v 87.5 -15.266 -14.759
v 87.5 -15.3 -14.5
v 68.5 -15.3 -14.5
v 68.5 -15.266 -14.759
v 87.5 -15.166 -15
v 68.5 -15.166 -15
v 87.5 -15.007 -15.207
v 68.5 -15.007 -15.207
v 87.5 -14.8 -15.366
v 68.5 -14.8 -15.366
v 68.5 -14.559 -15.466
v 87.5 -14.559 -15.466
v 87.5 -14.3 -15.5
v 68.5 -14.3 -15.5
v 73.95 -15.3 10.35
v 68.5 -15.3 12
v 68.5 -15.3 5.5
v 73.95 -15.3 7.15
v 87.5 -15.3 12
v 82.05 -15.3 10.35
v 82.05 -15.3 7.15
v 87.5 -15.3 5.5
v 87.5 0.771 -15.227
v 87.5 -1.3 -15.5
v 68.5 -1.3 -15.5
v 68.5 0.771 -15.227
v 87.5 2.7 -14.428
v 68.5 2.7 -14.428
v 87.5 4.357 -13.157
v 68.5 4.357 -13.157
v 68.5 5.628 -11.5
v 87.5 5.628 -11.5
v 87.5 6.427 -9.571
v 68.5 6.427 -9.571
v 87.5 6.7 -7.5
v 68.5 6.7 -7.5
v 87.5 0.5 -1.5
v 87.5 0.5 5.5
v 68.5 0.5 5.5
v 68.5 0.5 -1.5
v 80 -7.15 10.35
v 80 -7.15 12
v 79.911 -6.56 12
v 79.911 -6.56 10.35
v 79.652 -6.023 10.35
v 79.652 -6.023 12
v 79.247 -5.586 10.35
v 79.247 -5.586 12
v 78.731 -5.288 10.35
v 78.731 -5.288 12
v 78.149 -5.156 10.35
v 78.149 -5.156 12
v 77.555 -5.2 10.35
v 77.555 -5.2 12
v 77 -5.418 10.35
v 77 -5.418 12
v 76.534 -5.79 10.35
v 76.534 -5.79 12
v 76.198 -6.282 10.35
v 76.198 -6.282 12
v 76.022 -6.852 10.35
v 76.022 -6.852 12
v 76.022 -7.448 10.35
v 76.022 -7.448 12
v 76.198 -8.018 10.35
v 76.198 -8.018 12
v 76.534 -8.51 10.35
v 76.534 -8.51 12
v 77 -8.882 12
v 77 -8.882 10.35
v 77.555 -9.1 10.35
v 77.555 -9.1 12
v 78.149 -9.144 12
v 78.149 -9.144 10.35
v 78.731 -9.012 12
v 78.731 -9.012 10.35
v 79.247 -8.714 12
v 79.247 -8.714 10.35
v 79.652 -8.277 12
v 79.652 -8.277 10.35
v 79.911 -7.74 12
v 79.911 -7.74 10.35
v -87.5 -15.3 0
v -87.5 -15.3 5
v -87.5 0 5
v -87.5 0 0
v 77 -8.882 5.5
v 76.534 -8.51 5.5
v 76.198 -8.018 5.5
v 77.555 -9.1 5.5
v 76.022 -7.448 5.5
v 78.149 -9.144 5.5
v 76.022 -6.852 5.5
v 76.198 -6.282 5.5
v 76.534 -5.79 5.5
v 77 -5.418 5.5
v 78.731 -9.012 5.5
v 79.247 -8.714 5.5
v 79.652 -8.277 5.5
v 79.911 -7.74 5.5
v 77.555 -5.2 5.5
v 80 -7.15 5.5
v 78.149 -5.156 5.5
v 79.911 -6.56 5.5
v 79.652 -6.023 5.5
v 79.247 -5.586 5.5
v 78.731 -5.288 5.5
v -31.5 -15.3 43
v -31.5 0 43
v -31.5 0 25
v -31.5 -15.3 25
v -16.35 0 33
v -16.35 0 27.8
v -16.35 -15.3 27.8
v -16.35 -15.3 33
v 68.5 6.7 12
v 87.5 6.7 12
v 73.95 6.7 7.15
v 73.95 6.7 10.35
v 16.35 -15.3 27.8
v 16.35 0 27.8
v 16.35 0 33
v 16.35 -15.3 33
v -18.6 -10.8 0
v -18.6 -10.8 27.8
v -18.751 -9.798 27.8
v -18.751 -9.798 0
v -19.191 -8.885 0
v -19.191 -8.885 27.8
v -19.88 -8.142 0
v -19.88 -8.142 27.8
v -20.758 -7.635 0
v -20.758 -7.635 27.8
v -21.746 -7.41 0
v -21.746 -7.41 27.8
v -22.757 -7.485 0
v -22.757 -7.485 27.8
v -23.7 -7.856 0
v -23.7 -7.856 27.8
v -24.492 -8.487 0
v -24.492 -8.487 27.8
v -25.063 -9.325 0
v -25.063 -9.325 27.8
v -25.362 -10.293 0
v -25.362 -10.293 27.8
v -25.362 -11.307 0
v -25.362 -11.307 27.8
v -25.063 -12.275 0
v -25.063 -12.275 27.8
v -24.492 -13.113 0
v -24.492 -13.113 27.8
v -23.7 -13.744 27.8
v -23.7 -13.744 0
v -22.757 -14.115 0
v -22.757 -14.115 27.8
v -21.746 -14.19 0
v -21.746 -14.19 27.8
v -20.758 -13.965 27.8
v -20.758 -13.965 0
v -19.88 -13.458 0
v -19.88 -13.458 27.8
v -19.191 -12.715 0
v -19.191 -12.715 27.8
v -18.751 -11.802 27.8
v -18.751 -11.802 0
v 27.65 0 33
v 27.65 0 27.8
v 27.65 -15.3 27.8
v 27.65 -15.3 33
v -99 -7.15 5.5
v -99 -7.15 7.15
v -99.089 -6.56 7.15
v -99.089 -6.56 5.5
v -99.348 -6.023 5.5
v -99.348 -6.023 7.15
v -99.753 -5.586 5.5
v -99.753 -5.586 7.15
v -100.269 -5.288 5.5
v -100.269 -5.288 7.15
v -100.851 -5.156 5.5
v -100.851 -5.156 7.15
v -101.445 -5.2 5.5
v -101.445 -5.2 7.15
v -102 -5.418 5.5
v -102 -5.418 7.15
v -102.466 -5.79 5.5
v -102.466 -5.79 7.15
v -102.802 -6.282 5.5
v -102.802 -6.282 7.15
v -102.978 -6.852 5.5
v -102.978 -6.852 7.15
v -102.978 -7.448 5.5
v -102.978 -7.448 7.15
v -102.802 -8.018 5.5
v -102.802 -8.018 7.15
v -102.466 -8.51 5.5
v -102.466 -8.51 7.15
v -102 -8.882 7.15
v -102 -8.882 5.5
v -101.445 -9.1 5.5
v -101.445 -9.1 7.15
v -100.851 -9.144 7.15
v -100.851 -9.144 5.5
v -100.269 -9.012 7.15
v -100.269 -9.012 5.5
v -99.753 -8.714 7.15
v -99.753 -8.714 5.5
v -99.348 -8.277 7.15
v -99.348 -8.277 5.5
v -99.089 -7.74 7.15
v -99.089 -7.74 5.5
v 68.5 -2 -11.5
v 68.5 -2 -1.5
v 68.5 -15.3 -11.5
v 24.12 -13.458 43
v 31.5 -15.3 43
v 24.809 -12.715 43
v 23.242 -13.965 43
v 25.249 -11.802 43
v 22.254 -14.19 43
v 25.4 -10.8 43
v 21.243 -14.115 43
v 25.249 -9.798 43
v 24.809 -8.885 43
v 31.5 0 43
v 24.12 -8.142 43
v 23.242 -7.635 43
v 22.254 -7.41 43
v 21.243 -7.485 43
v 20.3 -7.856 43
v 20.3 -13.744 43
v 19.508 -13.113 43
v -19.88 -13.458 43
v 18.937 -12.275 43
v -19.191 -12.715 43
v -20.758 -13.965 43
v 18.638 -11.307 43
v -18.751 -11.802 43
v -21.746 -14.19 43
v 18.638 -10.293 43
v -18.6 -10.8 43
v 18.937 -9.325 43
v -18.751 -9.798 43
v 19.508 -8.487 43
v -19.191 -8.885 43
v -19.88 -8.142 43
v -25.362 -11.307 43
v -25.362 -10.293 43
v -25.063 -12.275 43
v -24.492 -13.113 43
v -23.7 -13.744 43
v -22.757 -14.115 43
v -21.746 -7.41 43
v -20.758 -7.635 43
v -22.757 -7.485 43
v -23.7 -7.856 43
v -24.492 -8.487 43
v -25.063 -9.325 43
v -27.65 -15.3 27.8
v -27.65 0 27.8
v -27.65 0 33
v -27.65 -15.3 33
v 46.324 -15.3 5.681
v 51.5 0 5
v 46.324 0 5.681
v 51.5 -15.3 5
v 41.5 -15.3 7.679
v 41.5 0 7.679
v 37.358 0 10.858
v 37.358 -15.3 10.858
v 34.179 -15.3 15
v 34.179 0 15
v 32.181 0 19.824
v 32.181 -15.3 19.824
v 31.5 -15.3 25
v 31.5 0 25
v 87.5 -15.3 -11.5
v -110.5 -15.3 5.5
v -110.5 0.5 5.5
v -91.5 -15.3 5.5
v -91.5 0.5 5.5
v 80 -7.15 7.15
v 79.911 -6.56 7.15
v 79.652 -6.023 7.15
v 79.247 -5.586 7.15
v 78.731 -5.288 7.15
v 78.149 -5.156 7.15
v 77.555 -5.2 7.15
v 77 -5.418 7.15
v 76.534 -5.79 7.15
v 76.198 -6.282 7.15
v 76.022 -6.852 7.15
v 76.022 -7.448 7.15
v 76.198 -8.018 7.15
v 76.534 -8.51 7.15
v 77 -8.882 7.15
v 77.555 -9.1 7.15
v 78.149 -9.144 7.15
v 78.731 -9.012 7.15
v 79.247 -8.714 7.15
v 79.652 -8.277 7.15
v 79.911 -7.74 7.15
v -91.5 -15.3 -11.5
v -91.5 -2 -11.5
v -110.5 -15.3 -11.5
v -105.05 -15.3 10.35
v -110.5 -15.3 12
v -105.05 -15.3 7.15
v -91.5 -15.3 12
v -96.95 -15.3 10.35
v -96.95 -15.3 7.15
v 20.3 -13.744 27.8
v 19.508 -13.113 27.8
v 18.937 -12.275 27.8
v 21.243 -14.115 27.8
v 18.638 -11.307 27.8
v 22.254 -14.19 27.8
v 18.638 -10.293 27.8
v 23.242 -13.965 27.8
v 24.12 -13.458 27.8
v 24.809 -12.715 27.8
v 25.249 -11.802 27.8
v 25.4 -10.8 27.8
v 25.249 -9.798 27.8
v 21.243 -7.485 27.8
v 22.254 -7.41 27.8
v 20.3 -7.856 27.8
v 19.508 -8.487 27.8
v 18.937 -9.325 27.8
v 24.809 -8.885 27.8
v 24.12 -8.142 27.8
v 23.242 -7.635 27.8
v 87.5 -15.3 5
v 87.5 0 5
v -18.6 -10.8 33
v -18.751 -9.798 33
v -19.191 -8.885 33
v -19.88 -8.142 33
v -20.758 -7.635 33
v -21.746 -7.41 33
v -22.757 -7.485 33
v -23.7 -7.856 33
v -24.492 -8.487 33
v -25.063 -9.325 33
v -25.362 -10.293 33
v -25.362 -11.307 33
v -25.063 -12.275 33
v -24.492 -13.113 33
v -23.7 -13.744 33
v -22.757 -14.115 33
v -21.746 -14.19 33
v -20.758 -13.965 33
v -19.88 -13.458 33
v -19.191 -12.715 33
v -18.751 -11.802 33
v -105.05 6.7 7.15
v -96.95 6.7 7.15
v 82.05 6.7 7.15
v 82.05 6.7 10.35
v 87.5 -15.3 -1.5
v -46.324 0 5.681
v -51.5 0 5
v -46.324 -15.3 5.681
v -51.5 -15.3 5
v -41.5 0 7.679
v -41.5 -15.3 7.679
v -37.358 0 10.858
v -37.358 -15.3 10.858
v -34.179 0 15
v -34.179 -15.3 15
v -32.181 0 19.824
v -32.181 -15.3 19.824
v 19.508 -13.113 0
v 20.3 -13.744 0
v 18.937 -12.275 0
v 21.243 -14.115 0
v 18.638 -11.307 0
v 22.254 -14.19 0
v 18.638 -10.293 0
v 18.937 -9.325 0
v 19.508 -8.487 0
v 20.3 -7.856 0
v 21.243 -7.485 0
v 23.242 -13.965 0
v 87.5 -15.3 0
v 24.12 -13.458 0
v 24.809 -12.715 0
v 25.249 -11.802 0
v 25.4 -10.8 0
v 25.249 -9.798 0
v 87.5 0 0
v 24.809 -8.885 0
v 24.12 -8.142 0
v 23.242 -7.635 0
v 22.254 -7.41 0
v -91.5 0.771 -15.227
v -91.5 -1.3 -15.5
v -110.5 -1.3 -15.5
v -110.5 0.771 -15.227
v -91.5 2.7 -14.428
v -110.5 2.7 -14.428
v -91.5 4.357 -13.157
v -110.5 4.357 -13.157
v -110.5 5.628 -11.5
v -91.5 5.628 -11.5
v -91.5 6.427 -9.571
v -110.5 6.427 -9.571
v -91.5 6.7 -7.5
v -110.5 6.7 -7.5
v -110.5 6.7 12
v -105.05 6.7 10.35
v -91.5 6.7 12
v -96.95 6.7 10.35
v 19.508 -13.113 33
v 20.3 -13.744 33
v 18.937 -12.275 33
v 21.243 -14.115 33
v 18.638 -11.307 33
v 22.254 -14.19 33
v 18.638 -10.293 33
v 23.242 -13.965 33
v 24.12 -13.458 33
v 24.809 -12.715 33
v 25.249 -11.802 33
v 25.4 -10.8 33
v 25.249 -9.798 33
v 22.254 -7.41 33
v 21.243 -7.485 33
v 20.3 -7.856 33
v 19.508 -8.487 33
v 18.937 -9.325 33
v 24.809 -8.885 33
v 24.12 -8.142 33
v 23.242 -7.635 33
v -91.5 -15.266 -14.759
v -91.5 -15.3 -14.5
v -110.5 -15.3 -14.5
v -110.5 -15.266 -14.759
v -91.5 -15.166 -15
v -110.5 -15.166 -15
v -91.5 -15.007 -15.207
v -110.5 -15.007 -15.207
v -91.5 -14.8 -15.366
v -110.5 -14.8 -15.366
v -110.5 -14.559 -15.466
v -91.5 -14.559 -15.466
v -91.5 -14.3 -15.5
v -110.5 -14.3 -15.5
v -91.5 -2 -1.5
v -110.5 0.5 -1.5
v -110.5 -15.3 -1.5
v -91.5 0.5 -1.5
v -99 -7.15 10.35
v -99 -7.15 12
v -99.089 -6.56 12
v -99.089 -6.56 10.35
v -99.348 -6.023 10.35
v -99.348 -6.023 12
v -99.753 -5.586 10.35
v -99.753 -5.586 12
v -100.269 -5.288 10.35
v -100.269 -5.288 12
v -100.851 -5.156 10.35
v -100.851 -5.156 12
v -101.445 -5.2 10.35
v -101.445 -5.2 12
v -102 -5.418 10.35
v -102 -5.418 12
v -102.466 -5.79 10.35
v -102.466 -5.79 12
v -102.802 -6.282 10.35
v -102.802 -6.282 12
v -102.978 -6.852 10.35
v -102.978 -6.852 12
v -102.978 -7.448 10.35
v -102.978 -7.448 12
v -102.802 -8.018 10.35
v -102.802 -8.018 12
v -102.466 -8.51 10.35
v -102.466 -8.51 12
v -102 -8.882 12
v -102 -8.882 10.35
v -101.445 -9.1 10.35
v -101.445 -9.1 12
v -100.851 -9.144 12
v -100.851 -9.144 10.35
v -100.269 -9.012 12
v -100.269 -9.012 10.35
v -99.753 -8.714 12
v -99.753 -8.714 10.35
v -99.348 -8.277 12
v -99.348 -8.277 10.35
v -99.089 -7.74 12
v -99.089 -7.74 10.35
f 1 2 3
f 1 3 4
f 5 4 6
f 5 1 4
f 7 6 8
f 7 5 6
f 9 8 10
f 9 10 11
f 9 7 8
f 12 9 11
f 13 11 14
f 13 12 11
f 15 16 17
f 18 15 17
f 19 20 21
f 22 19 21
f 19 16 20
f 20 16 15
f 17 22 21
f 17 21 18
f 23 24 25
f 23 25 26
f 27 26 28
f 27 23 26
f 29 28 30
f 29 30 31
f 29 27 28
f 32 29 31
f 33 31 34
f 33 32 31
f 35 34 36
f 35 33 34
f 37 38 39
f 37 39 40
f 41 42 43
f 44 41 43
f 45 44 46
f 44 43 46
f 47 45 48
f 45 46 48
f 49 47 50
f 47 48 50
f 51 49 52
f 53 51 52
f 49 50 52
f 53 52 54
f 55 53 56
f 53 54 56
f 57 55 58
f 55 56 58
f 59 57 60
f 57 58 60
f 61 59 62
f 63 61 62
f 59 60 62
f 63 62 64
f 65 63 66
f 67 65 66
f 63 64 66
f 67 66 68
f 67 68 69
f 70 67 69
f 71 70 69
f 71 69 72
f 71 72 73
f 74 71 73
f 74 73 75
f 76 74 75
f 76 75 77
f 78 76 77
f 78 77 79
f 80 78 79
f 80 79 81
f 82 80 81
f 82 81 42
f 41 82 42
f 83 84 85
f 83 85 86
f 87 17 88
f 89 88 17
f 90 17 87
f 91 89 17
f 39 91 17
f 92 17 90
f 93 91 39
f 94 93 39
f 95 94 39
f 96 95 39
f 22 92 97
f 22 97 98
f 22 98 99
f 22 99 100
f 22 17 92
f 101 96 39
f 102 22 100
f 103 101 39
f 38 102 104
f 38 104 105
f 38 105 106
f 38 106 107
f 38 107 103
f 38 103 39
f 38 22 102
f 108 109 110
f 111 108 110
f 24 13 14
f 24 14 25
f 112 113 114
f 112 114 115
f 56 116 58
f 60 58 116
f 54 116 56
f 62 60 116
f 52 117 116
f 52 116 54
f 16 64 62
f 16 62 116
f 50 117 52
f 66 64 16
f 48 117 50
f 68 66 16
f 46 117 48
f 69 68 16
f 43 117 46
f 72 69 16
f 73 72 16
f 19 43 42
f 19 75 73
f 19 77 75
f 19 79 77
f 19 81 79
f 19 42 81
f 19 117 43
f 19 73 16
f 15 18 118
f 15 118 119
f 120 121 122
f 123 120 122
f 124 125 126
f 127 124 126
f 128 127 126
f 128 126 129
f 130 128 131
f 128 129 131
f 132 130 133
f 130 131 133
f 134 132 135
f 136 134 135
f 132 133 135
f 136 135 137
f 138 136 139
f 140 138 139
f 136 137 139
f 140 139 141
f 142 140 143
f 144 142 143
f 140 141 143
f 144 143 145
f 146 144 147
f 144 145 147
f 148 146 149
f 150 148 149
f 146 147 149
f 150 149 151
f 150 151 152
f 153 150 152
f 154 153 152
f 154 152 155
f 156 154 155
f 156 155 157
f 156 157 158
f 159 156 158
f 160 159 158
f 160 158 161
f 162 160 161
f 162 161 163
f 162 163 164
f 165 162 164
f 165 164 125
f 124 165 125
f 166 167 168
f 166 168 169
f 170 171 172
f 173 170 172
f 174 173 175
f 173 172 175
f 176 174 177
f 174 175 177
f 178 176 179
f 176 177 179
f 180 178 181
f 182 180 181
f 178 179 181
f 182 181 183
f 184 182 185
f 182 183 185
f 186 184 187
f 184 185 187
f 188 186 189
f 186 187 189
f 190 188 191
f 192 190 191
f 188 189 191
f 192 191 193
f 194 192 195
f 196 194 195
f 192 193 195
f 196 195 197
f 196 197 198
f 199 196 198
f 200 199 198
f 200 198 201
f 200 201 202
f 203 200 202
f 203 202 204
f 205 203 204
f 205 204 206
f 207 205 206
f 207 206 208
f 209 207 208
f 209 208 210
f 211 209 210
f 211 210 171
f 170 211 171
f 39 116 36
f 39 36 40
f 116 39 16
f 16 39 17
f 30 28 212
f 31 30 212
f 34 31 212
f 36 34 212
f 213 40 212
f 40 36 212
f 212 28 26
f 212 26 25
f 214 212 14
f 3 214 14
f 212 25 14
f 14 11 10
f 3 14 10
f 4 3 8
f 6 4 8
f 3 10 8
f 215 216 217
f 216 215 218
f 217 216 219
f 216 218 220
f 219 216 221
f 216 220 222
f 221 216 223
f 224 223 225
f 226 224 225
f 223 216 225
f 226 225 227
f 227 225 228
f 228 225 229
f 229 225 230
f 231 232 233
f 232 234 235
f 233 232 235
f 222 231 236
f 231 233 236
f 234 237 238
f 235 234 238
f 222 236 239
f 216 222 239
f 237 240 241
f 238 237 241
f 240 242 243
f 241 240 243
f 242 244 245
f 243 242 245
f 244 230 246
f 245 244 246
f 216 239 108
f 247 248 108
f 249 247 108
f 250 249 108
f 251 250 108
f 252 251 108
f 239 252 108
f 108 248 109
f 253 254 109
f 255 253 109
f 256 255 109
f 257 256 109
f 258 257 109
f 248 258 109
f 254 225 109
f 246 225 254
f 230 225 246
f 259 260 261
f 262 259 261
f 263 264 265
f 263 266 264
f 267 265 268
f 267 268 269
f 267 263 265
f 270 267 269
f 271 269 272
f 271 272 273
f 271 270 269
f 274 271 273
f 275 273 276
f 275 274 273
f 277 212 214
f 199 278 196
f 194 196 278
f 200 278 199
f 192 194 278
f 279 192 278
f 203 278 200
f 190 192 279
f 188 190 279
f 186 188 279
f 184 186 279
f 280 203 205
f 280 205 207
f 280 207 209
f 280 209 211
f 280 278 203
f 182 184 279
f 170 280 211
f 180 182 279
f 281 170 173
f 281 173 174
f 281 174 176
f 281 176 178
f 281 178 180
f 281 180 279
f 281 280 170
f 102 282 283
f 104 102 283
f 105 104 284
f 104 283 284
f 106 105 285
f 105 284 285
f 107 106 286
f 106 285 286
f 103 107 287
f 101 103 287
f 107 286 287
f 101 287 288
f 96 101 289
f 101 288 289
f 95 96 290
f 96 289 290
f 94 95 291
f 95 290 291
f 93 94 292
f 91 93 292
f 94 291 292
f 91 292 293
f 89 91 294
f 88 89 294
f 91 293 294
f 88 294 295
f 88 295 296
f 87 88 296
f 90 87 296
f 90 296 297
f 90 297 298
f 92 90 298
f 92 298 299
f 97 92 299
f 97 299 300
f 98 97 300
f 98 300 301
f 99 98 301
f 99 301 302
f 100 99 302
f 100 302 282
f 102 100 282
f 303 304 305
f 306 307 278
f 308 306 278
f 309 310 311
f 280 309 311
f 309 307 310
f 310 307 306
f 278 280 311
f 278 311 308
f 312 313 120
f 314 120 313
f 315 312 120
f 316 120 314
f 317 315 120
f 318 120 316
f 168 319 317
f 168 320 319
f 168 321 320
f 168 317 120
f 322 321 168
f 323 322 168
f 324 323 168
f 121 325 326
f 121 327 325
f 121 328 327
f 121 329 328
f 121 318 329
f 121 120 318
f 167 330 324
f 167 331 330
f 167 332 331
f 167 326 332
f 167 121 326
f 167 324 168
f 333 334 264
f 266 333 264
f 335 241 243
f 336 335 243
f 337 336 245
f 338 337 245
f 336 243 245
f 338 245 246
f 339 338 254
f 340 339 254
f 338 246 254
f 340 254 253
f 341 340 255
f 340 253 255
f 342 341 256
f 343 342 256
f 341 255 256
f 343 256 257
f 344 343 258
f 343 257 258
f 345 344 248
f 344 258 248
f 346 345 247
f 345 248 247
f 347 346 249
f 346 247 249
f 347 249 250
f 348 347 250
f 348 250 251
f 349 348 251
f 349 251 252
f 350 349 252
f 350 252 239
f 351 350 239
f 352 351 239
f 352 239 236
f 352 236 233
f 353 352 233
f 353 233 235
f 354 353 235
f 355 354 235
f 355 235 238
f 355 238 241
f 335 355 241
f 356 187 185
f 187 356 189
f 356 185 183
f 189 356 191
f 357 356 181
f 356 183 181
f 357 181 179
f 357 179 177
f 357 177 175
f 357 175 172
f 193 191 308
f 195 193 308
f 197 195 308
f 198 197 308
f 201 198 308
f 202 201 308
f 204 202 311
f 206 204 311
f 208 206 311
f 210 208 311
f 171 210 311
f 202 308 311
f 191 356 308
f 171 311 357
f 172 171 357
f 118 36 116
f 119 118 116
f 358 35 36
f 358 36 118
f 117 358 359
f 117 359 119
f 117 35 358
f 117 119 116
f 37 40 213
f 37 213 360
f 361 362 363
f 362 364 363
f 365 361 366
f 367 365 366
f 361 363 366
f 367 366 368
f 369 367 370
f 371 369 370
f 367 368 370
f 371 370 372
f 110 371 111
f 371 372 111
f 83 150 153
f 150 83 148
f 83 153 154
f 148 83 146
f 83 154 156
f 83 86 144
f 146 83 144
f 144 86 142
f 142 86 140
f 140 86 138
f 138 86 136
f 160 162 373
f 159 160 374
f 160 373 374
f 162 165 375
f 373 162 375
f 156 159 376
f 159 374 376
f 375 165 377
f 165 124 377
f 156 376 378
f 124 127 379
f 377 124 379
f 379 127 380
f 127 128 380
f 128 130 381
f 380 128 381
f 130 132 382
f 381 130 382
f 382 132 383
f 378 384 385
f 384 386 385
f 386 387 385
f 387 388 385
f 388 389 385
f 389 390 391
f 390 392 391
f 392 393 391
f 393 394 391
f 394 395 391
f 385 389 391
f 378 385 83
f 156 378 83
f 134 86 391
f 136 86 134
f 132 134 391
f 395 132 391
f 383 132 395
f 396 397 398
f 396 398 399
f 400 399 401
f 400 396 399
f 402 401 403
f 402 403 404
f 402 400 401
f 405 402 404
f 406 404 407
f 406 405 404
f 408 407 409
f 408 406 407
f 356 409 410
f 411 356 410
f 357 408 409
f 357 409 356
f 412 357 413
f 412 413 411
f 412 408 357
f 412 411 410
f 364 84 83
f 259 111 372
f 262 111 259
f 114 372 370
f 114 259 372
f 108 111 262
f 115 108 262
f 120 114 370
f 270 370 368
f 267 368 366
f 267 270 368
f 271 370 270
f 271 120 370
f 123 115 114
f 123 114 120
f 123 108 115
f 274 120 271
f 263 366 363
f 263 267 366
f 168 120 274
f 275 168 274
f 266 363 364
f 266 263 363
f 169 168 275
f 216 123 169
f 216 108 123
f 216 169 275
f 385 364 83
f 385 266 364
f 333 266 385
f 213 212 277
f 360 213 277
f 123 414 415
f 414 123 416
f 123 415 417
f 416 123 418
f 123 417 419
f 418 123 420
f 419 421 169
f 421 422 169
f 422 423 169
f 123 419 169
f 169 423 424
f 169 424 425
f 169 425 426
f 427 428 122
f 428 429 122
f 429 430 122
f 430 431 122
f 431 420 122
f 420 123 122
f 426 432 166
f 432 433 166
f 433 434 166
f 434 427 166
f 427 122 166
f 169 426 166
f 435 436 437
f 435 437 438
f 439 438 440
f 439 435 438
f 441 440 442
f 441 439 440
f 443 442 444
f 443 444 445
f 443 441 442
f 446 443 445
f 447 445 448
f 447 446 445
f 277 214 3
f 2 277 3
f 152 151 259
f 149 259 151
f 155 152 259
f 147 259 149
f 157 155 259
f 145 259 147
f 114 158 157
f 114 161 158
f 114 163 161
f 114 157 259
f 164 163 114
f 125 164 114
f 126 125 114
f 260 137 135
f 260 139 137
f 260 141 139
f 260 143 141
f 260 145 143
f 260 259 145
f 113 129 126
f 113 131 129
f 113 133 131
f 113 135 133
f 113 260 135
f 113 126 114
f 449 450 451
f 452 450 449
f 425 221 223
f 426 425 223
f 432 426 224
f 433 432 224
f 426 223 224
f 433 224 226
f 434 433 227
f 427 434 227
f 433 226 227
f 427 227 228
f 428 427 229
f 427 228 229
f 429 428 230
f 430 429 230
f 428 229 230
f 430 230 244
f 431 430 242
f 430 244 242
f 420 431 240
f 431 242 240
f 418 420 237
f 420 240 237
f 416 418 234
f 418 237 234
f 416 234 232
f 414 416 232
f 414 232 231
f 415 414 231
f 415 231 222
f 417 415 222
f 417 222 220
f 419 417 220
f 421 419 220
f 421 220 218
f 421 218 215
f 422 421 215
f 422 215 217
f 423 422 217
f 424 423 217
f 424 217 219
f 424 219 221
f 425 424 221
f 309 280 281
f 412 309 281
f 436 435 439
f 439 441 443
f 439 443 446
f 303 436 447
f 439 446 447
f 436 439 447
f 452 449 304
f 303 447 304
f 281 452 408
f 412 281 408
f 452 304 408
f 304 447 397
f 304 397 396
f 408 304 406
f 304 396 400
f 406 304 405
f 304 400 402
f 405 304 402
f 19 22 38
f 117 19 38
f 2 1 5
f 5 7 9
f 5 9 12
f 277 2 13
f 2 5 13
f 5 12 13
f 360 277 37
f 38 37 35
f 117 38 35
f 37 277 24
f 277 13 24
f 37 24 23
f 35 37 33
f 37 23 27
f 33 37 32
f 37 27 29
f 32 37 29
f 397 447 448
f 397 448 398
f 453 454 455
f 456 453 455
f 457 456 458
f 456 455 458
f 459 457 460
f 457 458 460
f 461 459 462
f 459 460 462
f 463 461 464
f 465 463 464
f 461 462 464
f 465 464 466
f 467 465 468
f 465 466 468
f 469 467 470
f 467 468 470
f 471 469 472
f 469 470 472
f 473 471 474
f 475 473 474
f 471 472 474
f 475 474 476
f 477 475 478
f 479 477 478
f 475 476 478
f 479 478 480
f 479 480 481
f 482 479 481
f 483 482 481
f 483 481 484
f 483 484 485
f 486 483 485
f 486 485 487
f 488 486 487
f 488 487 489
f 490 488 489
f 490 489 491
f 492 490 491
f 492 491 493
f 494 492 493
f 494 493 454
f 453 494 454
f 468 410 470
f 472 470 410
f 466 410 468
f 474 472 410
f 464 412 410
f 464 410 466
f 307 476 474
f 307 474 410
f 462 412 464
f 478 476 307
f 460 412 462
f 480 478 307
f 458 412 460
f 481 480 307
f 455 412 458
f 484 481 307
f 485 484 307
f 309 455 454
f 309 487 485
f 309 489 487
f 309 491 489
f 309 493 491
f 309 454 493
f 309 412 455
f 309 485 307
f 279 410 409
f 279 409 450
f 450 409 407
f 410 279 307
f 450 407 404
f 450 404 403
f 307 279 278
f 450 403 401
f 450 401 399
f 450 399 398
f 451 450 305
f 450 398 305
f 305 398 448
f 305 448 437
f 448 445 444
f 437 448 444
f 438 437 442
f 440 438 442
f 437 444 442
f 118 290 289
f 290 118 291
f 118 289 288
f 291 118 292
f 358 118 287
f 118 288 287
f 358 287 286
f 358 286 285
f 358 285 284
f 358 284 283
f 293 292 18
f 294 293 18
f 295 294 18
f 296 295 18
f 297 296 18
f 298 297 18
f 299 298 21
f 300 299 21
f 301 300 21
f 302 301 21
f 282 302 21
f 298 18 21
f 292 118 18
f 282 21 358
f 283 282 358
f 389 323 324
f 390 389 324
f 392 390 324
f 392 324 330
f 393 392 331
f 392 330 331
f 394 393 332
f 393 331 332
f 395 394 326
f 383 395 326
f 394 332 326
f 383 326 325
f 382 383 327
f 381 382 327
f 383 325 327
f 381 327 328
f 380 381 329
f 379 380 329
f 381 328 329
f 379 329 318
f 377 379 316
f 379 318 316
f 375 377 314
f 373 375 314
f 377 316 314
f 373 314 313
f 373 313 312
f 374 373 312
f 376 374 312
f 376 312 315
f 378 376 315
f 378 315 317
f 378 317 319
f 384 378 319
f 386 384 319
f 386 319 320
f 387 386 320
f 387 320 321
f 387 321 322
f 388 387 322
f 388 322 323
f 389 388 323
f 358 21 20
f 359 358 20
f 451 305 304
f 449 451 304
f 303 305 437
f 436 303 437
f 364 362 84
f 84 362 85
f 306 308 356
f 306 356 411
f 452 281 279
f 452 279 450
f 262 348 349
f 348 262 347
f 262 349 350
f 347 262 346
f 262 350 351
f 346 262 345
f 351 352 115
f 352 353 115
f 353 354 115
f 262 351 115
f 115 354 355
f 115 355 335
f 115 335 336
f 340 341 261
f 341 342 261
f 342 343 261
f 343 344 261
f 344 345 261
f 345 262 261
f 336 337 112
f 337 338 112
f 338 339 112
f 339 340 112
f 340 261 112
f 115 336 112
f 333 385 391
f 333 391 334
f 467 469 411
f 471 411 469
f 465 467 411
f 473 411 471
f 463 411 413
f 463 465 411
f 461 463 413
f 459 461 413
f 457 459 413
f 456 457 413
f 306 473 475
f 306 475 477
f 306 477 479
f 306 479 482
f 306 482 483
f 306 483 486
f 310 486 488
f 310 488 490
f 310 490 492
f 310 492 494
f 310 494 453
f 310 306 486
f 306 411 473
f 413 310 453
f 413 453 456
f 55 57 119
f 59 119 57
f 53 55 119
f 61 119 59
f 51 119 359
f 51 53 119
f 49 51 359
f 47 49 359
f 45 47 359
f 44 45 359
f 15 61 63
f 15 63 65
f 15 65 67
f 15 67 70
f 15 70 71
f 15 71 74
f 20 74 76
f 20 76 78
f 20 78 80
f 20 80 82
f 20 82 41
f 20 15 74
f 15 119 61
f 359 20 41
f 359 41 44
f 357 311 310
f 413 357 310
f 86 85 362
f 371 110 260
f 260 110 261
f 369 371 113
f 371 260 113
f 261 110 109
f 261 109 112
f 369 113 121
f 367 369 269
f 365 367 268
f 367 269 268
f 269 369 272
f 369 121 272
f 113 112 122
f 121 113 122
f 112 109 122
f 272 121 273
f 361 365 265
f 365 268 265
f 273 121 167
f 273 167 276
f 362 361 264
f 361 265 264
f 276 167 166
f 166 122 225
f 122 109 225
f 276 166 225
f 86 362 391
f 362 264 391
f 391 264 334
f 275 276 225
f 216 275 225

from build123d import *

# Parameters (mm, degrees)
F0_W      = 11.3
F0_H      = 5.2
F1_DEPTH  = 15.3
F2_R      = 3.4
F3_DEPTH  = 43
F5_DEPTH  = 19
F6_W      = 8.1
F6_H      = 3.2
F7_DEPTH  = 22
F8_R      = 2
F9_DEPTH  = 6.5
F12_DEPTH = 10
F14_DEPTH = 10
F15_R     = 20


with BuildPart() as f1:
    # F0 (on Front) → F1 (new body)
    with BuildSketch(Plane.XZ):
        Polygon((-87.5, 5), (-87.5, 0), (87.5, 0), (87.5, 5), (31.5, 5), (31.5, 43), (-31.5, 43), (-31.5, 5), align=None)
        with Locations((-22, 30.4)):
            Rectangle(F0_W, F0_H, mode=Mode.SUBTRACT)
        with Locations((22, 30.4)):
            Rectangle(F0_W, F0_H, mode=Mode.SUBTRACT)
    extrude(amount=F1_DEPTH)

    # F2 (on face) → F3 (cut, through all)
    with BuildSketch(Plane.XY.offset(43)):
        with Locations((-22, -10.8)):
            Circle(F2_R)
        with Locations((22, -10.8)):
            Circle(F2_R)
    extrude(amount=-F3_DEPTH, mode=Mode.SUBTRACT)

    # F15
    f15_edges = [f1.edges().sort_by_distance(p)[0] for p in [
        (31.5, -7.65, 5),
        (-31.5, -7.65, 5),
    ]]
    fillet(f15_edges, radius=F15_R)


with BuildPart() as f5:
    # F4 (on face) → F5 (new body)
    with BuildSketch(Plane.YZ.offset(87.5)):
        with BuildLine():
            Line((6.7, 12), (-15.3, 12))
            Line((-15.3, 12), (-15.3, 5.5))
            Line((-15.3, 5.5), (0.5, 5.5))
            Line((0.5, 5.5), (0.5, -11.5))
            Line((0.5, -11.5), (-15.3, -11.5))
            Line((-15.3, -11.5), (-15.3, -14.5))
            ThreePointArc((-15.3, -14.5), (-15.0071067812, -15.2071067812), (-14.3, -15.5))
            Line((-14.3, -15.5), (-1.3, -15.5))
            ThreePointArc((-1.3, -15.5), (4.3568542495, -13.1568542495), (6.7, -7.5))
            Line((6.7, -7.5), (6.7, 12))
        make_face()
    extrude(amount=-F5_DEPTH)

    # F6 (on face) → F7 (cut, through all)
    with BuildSketch(Plane.XZ.offset(15.3)):
        with Locations((78, 8.75)):
            Rectangle(F6_W, F6_H)
    extrude(amount=-F7_DEPTH, mode=Mode.SUBTRACT)

    # F8 (on face) → F9 (cut, through all)
    with BuildSketch(Plane.XY.offset(12)):
        with Locations((78, -7.15)):
            Circle(F8_R)
    extrude(amount=-F9_DEPTH, mode=Mode.SUBTRACT)


with BuildPart() as f10_1:
    # F10: copy of F5
    add(f5.part.moved(Location((-179, 0, 0))))

    # F13 (on face) → F14 (join)
    with BuildSketch(Plane.XY.offset(-11.5)):
        Polygon((-91.5, -2), (-91.5, 0.5), (-110.5, 0.5), (-110.5, -15.3), align=None)
    extrude(amount=F14_DEPTH)


with BuildPart() as f5_1:
    add(f5.part)

    # F11 (on face) → F12 (join)
    with BuildSketch(Plane.XY.offset(-11.5)):
        Polygon((87.5, 0.5), (68.5, 0.5), (68.5, -2), (87.5, -15.3), align=None)
    extrude(amount=F12_DEPTH)


solid = Compound([f1.part, f10_1.part, f5_1.part])
